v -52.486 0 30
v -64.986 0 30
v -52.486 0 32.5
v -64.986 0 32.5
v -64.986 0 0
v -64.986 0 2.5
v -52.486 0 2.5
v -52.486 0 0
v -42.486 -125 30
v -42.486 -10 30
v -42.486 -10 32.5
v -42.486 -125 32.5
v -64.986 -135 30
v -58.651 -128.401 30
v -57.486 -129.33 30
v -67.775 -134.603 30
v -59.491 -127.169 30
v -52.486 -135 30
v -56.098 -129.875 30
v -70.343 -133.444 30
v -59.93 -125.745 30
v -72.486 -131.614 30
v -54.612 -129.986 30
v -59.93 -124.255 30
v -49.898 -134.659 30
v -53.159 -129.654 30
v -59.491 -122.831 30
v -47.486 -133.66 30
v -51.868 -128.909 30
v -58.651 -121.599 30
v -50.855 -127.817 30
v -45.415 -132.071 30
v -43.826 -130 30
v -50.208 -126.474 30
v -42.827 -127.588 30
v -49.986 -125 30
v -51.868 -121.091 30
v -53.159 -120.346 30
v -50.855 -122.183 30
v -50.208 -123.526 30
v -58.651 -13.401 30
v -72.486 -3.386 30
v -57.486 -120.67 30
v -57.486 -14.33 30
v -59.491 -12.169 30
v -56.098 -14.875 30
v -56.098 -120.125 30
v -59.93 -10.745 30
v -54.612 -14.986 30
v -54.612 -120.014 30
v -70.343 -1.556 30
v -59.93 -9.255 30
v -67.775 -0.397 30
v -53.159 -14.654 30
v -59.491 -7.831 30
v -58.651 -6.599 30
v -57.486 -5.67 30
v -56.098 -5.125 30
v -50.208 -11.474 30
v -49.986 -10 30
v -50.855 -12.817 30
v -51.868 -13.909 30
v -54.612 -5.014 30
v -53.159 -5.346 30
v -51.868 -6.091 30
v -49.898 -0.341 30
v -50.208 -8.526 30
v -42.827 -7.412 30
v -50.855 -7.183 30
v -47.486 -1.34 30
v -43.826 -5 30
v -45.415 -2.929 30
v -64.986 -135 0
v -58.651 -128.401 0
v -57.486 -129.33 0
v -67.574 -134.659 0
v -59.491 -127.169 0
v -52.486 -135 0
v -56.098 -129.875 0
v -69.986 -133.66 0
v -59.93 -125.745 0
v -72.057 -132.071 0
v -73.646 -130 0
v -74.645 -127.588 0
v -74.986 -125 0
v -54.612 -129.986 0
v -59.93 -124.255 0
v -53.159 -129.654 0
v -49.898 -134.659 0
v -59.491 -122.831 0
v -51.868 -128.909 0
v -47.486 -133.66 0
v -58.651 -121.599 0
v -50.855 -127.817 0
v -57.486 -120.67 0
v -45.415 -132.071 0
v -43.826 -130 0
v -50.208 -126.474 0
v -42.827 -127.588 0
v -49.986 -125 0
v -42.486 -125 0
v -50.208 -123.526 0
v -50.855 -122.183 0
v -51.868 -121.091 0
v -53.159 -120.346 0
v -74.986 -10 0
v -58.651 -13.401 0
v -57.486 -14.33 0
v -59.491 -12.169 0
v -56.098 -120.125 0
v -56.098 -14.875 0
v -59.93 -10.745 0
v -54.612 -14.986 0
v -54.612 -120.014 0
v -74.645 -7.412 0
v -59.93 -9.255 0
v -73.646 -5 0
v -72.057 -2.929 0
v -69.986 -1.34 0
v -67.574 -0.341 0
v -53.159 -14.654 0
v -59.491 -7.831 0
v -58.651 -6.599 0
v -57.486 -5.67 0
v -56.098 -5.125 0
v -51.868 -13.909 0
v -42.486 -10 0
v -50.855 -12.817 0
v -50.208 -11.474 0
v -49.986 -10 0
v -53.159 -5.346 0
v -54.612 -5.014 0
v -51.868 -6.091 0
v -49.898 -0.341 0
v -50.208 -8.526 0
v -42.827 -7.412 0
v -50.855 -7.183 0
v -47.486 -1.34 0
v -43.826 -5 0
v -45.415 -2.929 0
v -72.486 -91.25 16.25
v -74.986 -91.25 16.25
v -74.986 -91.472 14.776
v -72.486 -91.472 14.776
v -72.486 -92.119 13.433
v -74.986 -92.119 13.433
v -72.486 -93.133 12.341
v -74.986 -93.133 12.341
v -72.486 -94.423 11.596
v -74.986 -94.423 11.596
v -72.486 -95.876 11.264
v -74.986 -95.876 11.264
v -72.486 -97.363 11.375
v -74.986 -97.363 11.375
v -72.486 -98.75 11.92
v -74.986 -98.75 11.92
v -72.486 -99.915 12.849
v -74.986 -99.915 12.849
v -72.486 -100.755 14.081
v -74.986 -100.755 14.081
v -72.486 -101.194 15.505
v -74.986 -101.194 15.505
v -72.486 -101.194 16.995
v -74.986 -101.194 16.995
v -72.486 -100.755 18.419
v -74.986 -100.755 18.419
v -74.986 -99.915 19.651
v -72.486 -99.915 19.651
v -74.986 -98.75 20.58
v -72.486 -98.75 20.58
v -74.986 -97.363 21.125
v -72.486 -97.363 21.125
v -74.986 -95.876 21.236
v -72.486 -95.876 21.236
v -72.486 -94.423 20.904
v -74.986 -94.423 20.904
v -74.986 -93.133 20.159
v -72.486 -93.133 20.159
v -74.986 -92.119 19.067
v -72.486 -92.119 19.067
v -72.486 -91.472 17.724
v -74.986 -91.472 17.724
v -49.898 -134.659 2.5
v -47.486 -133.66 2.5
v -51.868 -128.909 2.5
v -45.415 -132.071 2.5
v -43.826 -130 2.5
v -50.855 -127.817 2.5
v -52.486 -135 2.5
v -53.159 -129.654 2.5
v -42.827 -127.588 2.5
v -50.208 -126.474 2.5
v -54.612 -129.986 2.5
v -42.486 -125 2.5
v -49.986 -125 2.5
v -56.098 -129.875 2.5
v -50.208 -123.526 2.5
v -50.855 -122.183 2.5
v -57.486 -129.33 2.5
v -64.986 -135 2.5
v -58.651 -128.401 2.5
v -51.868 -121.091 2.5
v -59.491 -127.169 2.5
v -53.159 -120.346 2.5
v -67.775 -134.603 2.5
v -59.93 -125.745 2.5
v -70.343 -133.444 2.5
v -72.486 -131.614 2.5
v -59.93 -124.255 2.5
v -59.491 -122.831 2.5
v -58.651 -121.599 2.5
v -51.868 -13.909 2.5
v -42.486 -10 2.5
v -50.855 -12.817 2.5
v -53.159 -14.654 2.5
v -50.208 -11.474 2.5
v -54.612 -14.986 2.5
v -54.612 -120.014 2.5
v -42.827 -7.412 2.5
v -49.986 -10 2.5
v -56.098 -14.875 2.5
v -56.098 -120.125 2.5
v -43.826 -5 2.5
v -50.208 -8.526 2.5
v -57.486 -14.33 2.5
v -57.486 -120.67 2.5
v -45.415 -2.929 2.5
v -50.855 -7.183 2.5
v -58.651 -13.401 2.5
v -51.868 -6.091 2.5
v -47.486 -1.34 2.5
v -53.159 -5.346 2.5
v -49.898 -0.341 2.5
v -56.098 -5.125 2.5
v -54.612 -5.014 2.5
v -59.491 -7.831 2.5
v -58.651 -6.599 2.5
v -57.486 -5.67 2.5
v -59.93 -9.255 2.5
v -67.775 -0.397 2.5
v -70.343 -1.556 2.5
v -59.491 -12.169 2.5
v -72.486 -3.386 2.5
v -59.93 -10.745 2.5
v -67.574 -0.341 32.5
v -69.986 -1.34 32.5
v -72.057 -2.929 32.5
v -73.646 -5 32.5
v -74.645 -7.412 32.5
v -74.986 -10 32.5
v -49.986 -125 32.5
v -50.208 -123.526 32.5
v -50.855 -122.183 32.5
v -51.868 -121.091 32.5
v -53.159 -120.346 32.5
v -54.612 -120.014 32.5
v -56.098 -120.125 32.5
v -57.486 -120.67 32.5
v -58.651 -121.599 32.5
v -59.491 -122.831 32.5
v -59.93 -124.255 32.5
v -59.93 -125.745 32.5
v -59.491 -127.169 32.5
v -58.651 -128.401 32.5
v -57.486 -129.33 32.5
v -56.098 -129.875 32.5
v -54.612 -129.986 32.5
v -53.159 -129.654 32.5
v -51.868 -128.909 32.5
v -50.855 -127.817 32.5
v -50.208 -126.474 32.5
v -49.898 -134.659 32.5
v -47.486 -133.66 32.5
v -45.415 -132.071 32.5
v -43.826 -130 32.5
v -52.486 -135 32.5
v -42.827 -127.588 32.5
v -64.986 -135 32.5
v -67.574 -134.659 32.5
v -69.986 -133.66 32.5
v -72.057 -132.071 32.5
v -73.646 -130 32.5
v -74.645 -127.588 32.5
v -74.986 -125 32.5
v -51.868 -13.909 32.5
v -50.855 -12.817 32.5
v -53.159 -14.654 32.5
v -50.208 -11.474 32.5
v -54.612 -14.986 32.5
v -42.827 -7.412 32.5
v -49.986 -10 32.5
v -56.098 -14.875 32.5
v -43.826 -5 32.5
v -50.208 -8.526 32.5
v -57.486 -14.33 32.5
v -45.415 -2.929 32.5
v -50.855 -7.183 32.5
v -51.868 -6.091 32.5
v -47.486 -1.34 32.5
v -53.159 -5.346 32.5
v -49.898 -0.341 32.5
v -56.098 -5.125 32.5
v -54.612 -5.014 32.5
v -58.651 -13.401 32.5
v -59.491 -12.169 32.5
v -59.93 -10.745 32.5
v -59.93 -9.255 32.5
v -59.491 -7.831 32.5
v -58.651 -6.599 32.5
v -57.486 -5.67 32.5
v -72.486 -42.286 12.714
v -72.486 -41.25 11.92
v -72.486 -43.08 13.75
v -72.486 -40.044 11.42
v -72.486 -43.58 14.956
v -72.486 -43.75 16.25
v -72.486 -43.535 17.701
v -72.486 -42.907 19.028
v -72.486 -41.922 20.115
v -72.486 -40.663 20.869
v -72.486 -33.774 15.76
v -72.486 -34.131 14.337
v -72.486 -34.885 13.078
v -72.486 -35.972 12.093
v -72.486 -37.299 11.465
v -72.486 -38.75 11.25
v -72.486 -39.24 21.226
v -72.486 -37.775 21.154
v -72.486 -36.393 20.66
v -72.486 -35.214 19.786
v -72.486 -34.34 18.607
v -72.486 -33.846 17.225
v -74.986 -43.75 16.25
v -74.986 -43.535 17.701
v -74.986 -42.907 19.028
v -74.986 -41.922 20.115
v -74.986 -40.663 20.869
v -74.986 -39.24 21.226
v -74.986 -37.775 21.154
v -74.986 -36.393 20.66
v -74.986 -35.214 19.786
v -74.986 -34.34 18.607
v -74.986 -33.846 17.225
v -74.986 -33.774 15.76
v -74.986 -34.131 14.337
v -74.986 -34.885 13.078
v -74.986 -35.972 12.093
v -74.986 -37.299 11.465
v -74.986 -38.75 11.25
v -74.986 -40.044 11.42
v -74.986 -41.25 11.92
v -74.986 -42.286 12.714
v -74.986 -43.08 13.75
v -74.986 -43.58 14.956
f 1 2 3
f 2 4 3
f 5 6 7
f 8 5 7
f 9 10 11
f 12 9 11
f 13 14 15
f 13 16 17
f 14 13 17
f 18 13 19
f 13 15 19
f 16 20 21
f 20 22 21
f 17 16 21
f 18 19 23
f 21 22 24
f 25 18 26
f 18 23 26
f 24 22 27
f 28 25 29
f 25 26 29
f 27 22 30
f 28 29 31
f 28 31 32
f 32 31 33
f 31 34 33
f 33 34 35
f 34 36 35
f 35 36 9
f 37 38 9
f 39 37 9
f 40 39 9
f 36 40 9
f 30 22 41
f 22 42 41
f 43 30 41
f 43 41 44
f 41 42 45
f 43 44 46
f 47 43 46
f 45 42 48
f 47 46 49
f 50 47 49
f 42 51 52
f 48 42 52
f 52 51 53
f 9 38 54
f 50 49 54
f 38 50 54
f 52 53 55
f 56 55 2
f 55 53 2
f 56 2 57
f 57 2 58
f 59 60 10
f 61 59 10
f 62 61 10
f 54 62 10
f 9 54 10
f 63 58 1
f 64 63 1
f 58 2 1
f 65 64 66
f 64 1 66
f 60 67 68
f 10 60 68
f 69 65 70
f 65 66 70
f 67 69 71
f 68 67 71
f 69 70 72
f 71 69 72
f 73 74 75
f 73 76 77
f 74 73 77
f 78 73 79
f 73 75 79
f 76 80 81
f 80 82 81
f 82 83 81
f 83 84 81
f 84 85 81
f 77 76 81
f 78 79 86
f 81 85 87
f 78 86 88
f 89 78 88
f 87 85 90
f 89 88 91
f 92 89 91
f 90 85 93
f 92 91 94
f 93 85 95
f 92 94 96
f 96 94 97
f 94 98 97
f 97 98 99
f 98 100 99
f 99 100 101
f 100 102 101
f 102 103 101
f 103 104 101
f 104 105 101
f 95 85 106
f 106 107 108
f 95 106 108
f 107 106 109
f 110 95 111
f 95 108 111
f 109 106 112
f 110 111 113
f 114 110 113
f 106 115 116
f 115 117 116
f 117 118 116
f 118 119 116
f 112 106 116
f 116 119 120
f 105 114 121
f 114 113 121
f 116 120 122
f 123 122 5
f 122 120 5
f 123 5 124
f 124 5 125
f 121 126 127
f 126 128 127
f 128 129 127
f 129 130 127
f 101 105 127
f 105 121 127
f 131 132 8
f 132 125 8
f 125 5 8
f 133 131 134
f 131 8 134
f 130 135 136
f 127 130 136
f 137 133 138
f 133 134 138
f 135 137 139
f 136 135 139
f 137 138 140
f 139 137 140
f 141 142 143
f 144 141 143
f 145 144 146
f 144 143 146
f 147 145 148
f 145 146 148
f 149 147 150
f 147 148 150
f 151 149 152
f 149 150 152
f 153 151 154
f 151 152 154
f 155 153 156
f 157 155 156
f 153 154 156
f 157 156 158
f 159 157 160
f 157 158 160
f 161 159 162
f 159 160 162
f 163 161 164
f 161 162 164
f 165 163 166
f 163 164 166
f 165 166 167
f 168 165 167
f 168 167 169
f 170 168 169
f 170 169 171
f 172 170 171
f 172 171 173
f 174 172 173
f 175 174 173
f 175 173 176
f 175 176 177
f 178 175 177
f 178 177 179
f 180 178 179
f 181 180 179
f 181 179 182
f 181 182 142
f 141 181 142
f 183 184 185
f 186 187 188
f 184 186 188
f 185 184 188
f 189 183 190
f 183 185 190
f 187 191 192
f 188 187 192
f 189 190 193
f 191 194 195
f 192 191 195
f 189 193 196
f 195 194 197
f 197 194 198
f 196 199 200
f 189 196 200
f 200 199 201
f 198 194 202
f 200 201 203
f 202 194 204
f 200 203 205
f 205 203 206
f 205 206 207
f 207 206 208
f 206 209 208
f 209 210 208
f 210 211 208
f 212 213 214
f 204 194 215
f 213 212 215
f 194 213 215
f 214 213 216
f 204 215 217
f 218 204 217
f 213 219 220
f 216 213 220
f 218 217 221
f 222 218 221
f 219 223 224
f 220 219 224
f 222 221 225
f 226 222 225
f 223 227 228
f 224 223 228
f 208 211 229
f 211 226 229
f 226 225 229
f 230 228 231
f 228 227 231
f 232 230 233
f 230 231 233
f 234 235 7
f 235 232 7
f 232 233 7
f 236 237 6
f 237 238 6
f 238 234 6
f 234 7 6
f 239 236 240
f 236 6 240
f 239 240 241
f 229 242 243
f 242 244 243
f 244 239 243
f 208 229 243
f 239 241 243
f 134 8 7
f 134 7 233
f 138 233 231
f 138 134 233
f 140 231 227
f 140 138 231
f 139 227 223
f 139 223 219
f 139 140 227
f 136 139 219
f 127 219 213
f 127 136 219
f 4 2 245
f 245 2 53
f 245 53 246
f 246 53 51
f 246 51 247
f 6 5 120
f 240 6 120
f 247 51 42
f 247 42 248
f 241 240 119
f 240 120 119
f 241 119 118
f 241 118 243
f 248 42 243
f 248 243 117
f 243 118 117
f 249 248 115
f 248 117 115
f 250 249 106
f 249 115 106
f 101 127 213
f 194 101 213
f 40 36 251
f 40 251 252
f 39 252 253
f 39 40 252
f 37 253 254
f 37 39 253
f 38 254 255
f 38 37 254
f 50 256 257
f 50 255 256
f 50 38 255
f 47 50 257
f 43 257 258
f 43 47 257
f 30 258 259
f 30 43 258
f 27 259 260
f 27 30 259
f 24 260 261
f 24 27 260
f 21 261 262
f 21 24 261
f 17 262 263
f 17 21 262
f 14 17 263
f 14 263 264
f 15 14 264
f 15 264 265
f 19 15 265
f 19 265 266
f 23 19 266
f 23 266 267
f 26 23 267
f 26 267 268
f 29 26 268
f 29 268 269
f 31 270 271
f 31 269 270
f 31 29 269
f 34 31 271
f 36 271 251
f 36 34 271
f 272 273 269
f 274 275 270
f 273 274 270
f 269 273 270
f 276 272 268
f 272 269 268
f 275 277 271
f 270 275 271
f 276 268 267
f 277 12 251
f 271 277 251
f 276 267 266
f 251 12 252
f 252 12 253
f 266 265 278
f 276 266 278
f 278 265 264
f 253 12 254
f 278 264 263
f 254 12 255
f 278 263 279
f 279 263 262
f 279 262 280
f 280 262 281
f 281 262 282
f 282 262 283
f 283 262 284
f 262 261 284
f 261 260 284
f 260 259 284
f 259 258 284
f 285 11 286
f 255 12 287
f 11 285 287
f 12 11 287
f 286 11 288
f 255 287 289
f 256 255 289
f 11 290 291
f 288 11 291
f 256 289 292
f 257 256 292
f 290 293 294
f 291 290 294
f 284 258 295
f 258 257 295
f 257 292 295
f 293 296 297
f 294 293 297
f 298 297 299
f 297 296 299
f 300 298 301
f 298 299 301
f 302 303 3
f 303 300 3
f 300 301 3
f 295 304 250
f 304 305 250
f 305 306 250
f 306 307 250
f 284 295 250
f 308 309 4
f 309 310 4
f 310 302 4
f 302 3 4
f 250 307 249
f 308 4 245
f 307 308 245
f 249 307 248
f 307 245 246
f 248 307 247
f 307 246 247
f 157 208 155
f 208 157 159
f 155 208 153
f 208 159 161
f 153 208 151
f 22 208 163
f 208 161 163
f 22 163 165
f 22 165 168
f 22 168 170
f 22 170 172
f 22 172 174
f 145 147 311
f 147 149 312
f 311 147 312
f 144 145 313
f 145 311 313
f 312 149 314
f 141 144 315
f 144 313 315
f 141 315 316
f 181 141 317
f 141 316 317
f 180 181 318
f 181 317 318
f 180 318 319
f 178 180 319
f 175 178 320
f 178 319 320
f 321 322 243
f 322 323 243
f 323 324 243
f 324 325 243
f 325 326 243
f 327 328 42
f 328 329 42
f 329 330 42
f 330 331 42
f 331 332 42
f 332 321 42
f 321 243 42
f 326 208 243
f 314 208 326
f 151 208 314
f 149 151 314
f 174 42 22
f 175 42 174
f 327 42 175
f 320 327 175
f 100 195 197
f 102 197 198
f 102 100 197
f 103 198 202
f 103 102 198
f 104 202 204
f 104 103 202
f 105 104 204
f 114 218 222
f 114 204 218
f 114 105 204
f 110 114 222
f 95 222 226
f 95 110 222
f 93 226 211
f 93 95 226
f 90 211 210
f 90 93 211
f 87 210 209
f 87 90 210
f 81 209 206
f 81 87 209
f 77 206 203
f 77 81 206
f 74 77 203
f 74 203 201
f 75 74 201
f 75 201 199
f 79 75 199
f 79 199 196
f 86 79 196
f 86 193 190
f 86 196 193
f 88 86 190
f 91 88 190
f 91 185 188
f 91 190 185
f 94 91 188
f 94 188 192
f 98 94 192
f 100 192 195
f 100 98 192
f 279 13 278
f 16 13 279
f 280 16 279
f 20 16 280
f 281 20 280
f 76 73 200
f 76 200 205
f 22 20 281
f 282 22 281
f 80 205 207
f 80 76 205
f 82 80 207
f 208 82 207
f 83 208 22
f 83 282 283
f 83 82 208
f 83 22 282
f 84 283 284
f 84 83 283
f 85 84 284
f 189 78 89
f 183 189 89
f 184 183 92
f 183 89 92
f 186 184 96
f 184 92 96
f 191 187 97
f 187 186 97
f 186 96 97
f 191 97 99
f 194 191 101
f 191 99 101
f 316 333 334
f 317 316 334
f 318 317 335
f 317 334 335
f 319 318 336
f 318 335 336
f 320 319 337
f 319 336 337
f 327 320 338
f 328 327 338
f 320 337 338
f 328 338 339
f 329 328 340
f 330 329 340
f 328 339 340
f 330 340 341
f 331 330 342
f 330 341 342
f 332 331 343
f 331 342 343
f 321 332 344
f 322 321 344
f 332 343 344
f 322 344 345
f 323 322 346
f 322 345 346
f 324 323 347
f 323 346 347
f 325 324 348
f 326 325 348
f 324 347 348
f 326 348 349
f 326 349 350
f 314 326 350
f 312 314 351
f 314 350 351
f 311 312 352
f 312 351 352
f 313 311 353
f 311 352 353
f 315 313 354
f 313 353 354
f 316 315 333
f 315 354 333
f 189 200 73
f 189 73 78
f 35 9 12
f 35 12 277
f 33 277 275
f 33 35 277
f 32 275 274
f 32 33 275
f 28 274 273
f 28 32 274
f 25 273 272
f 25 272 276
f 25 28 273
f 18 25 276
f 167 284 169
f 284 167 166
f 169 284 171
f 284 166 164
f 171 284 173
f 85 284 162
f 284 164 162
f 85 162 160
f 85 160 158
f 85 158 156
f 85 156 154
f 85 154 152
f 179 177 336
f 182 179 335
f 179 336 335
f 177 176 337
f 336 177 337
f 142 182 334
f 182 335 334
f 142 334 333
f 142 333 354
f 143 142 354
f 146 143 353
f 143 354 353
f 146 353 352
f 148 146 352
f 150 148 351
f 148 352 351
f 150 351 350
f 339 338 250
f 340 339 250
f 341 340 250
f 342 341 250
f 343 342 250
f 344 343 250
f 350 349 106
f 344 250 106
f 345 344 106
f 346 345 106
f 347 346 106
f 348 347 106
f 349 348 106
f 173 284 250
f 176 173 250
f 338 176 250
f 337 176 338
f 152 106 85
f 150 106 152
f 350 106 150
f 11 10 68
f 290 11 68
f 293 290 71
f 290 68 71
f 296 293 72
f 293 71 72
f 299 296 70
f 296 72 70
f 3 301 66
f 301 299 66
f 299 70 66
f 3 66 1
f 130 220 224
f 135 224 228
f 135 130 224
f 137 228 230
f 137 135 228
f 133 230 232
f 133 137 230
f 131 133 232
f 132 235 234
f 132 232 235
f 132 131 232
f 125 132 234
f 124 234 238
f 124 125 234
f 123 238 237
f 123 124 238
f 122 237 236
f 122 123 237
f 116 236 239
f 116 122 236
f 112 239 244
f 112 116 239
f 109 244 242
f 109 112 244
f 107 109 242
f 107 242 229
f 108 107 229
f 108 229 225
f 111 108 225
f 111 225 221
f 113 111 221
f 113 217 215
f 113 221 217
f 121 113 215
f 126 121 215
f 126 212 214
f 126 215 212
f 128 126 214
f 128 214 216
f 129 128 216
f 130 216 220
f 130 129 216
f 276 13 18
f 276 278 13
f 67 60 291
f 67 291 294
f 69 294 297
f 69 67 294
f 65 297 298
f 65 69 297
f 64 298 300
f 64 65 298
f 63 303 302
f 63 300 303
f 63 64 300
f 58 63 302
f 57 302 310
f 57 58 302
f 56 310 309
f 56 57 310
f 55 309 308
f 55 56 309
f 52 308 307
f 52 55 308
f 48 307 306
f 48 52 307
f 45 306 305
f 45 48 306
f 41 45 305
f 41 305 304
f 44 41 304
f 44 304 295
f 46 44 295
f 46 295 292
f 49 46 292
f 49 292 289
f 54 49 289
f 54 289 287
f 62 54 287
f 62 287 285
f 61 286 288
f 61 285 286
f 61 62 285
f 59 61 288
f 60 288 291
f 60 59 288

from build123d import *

# Parameters (mm, degrees)
F2_DEPTH    = 135
F1_R        = 5
F3_DEPTH    = 46
F4_T1_DEPTH = 52.5
F4_T3_DEPTH = 52.5
F4_T5_DEPTH = 82.5
F7_DEPTH    = 25


# Not quite as in the source:
# - a fillet or chamfer that OpenCascade refuses, or shapes differently, is made with other operations: its cross-section is extruded or revolved along the edge and cut away or added


with BuildPart() as f2:
    # F0 (on Front) → F2 (new body)
    with BuildSketch(Plane.XZ):
        Polygon((-74.9858543277, 32.5), (-74.9858543277, 0), (-42.4858543277, 0), (-42.4858543277, 2.5), (-72.4858543277, 2.5), (-72.4858543277, 30), (-42.4858543277, 30), (-42.4858543277, 32.5), align=None)
    extrude(amount=F2_DEPTH)

    # F1 (on Top) → F3 (cut)
    with BuildSketch(Plane.XY):
        with Locations((-54.9858543277, -260)):
            Circle(F1_R)
        with Locations((-54.9858543277, -125)):
            Circle(F1_R)
        with Locations((-54.9858543277, -10)):
            Circle(F1_R)
    extrude(amount=F3_DEPTH, mode=Mode.SUBTRACT)

    # F4: fillet of radius 10 on 6 edges, made by hand

    # F4_s2 → F4_t1 (cut)
    with BuildSketch(Plane.XY.offset(-25)):
        with BuildLine():
            ThreePointArc((-52.4858543277, 0), (-45.4147865158, -2.9289321881), (-42.4858543277, -10))
            Line((-42.4858543277, -10), (-42.4858543277, 0))
            Line((-42.4858543277, 0), (-52.4858543277, 0))
        make_face()
        with BuildLine():
            ThreePointArc((-52.4858543277, -135), (-45.4147865158, -132.0710678119), (-42.4858543277, -125))
            Line((-42.4858543277, -125), (-42.4858543277, -135))
            Line((-42.4858543277, -135), (-52.4858543277, -135))
        make_face()
    extrude(amount=F4_T1_DEPTH, mode=Mode.SUBTRACT)

    # F4_s4 → F4_t3 (cut)
    with BuildSketch(Plane.XY.offset(5)):
        with BuildLine():
            ThreePointArc((-42.4858543277, -10), (-45.4147865158, -2.9289321881), (-52.4858543277, 0))
            Line((-52.4858543277, 0), (-42.4858543277, 0))
            Line((-42.4858543277, 0), (-42.4858543277, -10))
        make_face()
        with BuildLine():
            ThreePointArc((-42.4858543277, -125), (-45.4147865158, -132.0710678119), (-52.4858543277, -135))
            Line((-52.4858543277, -135), (-42.4858543277, -135))
            Line((-42.4858543277, -135), (-42.4858543277, -125))
        make_face()
    extrude(amount=F4_T3_DEPTH, mode=Mode.SUBTRACT)

    # F4_s6 → F4_t5 (cut)
    with BuildSketch(Plane.XY.offset(-25)):
        with BuildLine():
            ThreePointArc((-64.9858543277, 0), (-72.0569221395, -2.9289321881), (-74.9858543277, -10))
            Line((-74.9858543277, -10), (-74.9858543277, 0))
            Line((-74.9858543277, 0), (-64.9858543277, 0))
        make_face()
        with BuildLine():
            ThreePointArc((-64.9858543277, -135), (-72.0569221395, -132.0710678119), (-74.9858543277, -125))
            Line((-74.9858543277, -125), (-74.9858543277, -135))
            Line((-74.9858543277, -135), (-64.9858543277, -135))
        make_face()
    extrude(amount=F4_T5_DEPTH, mode=Mode.SUBTRACT)

    # F6 (on offset) → F7 (cut)
    with BuildSketch(Plane(origin=(-74.9858543277, 0, 0), x_dir=(0, -1, 0), z_dir=(-1, 0, 0))):
        with BuildLine():
            Line((38.75, 16.25), (43.75, 16.25))
            ThreePointArc((43.75, 16.25), (35.2144660941, 19.7855339059), (38.75, 11.25))
            Line((38.75, 11.25), (38.75, 16.25))
        make_face()
        with BuildLine():
            ThreePointArc((38.75, 11.25), (42.2855339059, 12.7144660941), (43.75, 16.25))
            Line((43.75, 16.25), (38.75, 16.25))
            Line((38.75, 16.25), (38.75, 11.25))
        make_face()
        with BuildLine():
            ThreePointArc((101.25, 16.25), (96.25, 21.25), (91.25, 16.25))
            ThreePointArc((91.25, 16.25), (96.25, 11.25), (101.25, 16.25))
        make_face()
    extrude(amount=-F7_DEPTH, mode=Mode.SUBTRACT)


solid = f2.part
